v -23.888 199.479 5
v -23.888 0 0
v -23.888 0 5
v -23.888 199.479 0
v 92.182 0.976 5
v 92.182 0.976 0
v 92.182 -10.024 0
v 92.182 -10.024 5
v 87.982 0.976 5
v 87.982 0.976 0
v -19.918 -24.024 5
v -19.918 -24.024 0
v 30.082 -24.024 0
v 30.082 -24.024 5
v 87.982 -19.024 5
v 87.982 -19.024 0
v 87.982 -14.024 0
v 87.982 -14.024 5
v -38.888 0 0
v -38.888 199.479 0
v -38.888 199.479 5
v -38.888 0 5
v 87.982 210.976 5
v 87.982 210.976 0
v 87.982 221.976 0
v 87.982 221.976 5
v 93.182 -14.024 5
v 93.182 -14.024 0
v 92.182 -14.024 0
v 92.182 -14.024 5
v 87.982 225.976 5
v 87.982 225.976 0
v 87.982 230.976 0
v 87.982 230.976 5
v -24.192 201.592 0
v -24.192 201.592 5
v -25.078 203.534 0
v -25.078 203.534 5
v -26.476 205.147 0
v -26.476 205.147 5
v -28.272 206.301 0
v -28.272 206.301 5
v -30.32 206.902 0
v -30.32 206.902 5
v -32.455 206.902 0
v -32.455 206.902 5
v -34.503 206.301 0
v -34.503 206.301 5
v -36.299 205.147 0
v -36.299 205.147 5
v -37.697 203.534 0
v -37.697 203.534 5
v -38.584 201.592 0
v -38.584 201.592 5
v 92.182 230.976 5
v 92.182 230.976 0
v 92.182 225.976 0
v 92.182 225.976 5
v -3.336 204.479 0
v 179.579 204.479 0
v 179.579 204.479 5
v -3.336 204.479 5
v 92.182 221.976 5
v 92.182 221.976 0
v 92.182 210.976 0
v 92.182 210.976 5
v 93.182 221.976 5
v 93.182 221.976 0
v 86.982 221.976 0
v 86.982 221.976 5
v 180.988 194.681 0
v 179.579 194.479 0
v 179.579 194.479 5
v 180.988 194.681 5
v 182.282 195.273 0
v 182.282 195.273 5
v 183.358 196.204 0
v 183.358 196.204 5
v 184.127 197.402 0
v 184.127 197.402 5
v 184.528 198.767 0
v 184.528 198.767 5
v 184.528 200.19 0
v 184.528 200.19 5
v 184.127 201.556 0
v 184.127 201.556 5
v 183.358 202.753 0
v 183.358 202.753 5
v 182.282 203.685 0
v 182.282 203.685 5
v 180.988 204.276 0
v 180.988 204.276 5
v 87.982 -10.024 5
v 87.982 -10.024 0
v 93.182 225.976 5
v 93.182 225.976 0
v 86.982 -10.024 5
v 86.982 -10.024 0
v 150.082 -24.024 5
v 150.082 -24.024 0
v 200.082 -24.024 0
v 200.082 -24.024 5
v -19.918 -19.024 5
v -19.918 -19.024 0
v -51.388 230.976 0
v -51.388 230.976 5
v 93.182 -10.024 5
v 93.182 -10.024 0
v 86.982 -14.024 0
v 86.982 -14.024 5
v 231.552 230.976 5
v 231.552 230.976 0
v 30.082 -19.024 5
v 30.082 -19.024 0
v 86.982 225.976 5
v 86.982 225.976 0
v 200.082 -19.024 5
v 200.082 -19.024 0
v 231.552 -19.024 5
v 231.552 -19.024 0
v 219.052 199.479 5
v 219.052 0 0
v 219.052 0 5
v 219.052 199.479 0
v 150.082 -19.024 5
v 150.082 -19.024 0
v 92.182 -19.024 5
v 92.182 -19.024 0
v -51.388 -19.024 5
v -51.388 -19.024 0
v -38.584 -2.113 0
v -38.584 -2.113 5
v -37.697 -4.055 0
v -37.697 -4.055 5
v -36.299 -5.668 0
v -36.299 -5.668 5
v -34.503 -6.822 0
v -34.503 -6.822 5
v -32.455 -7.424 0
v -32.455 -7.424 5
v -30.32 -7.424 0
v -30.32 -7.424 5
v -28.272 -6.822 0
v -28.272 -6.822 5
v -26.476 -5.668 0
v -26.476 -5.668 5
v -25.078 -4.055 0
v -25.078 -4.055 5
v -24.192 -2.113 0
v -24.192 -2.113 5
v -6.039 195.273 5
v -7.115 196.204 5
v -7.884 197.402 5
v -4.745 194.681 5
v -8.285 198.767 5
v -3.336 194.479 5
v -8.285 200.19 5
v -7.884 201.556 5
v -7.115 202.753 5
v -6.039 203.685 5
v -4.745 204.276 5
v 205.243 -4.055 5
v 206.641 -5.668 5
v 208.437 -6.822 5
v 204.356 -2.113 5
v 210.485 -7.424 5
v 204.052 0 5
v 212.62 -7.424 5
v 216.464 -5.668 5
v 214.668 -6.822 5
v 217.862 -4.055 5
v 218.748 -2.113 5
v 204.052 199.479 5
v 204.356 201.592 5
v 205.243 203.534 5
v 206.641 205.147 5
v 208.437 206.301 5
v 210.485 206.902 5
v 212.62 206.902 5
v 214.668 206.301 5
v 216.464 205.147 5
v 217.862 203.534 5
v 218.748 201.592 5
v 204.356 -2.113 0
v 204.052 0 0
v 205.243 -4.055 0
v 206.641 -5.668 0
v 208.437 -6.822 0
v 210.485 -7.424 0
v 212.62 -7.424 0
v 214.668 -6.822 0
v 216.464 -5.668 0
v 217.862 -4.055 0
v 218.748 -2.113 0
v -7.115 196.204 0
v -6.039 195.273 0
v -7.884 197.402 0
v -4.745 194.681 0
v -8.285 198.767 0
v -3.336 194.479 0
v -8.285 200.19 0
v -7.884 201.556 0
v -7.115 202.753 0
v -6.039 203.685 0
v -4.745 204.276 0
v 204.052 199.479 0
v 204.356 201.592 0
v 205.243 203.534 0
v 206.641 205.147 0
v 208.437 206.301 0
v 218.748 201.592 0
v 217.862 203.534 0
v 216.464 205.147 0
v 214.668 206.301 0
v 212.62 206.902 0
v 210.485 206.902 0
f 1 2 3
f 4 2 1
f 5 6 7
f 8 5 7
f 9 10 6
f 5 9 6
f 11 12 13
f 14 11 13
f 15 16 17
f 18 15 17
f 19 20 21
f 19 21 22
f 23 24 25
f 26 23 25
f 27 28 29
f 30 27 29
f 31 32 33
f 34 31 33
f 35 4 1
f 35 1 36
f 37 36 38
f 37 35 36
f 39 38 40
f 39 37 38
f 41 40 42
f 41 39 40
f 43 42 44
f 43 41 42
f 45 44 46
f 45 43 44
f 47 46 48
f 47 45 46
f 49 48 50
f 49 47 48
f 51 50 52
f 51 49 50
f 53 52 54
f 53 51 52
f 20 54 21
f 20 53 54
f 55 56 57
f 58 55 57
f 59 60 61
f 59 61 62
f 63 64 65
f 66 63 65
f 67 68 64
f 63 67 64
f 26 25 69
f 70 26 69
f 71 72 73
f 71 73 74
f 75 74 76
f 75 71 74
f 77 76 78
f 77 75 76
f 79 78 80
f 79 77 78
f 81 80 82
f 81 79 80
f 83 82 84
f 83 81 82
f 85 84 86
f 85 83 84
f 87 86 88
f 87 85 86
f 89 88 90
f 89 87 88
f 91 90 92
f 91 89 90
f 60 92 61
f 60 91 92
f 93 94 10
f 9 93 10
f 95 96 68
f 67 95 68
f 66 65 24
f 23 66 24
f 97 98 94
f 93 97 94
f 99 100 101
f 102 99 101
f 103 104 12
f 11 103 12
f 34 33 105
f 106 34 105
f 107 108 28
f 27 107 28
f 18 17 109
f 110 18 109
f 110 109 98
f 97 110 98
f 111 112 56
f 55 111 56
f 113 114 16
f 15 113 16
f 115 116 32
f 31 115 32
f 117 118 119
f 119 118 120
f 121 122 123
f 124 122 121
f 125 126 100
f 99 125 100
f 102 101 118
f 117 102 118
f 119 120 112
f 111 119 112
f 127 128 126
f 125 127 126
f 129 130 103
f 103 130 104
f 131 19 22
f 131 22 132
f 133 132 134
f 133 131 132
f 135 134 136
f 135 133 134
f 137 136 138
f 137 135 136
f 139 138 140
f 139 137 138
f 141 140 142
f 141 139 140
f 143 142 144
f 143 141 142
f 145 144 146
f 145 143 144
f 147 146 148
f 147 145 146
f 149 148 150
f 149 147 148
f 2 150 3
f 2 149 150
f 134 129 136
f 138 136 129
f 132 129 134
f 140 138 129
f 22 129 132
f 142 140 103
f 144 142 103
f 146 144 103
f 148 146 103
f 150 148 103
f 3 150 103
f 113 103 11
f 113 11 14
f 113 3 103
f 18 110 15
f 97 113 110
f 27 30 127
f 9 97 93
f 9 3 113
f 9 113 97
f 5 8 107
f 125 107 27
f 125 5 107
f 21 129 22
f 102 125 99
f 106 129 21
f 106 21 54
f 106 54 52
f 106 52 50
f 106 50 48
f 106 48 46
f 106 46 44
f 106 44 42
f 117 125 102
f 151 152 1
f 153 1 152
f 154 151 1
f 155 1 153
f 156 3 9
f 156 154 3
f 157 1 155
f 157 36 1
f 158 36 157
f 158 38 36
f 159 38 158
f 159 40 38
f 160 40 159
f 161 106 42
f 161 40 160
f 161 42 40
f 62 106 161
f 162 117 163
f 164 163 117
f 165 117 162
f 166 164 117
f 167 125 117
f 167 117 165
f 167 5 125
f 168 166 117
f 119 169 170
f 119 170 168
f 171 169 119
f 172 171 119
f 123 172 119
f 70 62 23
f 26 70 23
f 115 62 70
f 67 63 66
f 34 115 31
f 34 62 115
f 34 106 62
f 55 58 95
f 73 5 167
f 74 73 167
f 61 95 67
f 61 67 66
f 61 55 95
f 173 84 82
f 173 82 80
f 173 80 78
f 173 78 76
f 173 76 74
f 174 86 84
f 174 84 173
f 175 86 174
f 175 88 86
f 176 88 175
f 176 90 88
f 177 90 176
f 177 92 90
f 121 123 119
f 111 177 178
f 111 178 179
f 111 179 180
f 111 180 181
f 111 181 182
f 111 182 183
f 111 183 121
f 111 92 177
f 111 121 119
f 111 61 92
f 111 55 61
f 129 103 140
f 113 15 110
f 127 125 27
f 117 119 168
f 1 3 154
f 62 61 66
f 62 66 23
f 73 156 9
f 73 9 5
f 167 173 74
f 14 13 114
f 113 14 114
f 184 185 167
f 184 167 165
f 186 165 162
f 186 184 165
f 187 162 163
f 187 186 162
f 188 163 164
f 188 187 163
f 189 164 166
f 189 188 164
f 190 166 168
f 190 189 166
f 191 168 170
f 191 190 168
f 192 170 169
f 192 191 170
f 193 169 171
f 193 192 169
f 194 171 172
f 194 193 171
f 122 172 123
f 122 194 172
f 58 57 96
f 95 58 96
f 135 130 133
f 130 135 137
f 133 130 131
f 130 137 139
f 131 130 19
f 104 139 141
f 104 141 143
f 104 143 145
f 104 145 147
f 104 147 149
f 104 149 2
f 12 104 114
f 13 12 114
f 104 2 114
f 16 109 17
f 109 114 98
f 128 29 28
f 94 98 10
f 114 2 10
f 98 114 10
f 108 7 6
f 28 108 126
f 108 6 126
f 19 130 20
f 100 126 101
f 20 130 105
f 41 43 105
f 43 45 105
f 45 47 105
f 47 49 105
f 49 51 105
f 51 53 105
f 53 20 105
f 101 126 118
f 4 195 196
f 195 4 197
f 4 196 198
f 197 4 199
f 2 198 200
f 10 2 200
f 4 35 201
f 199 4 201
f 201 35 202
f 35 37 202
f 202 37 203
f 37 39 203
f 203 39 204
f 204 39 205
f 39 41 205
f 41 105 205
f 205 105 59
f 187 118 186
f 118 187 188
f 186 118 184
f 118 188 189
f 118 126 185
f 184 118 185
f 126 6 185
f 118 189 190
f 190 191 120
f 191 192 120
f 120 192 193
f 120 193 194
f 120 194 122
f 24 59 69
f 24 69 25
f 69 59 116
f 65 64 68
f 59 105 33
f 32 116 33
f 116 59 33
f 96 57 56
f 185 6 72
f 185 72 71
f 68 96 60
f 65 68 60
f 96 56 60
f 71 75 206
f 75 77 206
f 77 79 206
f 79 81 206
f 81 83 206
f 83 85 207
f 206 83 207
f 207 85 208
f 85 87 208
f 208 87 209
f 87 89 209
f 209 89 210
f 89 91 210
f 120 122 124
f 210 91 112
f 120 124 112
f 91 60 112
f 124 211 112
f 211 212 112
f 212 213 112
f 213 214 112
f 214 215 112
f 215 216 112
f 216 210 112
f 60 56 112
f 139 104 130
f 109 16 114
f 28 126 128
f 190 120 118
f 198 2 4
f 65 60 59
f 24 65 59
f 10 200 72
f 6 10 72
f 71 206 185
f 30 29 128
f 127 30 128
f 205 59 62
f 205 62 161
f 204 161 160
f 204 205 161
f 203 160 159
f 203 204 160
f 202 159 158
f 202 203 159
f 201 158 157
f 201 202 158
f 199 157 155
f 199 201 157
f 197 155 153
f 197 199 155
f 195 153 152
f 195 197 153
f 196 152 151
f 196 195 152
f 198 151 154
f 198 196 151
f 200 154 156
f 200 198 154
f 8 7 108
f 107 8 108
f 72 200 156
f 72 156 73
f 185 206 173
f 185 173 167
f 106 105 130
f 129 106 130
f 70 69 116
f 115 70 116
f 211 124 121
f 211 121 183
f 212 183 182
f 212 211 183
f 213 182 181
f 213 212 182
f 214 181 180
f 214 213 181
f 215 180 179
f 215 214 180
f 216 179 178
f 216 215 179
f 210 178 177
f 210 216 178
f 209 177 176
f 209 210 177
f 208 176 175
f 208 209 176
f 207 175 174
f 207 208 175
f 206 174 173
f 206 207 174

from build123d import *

# Parameters (mm, degrees)
BOSS_EXTRU_1_DEPTH      = 5
ENL_V_MAT_EXTRU_1_DEPTH = 328.095566225


with BuildPart() as part:
    # Esquisse1 → Boss.-Extru.1 (new body)
    with BuildSketch(Plane.XY):
        Polygon((-51.387751479, -19.023668639), (-19.917751479, -19.023668639), (-19.917751479, -24.023668639), (30.082248521, -24.023668639), (30.082248521, -19.023668639), (87.982248521, -19.023668639), (87.982248521, -14.023668639), (86.982248521, -14.023668639), (86.982248521, -10.023668639), (87.982248521, -10.023668639), (87.982248521, 0.976331361), (92.182248521, 0.976331361), (92.182248521, -10.023668639), (93.182248521, -10.023668639), (93.182248521, -14.023668639), (92.182248521, -14.023668639), (92.182248521, -19.023668639), (150.082248521, -19.023668639), (150.082248521, -24.023668639), (200.082248521, -24.023668639), (200.082248521, -19.023668639), (231.552248521, -19.023668639), (231.552248521, 230.976331361), (200.082248521, 230.976331361), (150.082248521, 230.976331361), (92.182248521, 230.976331361), (92.182248521, 225.976331361), (93.182248521, 225.976331361), (93.182248521, 221.976331361), (92.182248521, 221.976331361), (92.182248521, 210.976331361), (87.982248521, 210.976331361), (87.982248521, 221.976331361), (86.982248521, 221.976331361), (86.982248521, 225.976331361), (87.982248521, 225.976331361), (87.982248521, 230.976331361), (30.082248521, 230.976331361), (-19.917751479, 230.976331361), (-51.387751479, 230.976331361), align=None)
    extrude(amount=BOSS_EXTRU_1_DEPTH)

    # Esquisse2 → Enlèv. mat.-Extru.1 (cut, through all)
    with BuildSketch(Plane(origin=(0, 0, 0), x_dir=(-1, 0, 0), z_dir=(0, 0, -1))):
        with BuildLine():
            Line((-204.052248521, 199.47878379), (-204.052248521, 0))
            ThreePointArc((-204.052248521, 0), (-211.552248521, -7.5), (-219.052248521, 0))
            Line((-219.052248521, 0), (-219.052248521, 199.47878379))
            ThreePointArc((-219.052248521, 199.47878379), (-211.552248521, 206.97878379), (-204.052248521, 199.47878379))
        make_face()
        with BuildLine():
            Line((-179.579242919, 204.47878379), (3.336091455, 204.47878379))
            ThreePointArc((3.336091455, 204.47878379), (8.336091455, 199.47878379), (3.336091455, 194.47878379))
            Line((3.336091455, 194.47878379), (-179.579242919, 194.47878379))
            ThreePointArc((-179.579242919, 194.47878379), (-184.579242919, 199.47878379), (-179.579242919, 204.47878379))
        make_face()
        with BuildLine():
            Line((38.887751479, 199.47878379), (38.887751479, 0))
            ThreePointArc((38.887751479, 0), (31.387751479, -7.5), (23.887751479, 0))
            Line((23.887751479, 0), (23.887751479, 199.47878379))
            ThreePointArc((23.887751479, 199.47878379), (31.387751479, 206.97878379), (38.887751479, 199.47878379))
        make_face()
    extrude(amount=-ENL_V_MAT_EXTRU_1_DEPTH, mode=Mode.SUBTRACT)


solid = part.part
